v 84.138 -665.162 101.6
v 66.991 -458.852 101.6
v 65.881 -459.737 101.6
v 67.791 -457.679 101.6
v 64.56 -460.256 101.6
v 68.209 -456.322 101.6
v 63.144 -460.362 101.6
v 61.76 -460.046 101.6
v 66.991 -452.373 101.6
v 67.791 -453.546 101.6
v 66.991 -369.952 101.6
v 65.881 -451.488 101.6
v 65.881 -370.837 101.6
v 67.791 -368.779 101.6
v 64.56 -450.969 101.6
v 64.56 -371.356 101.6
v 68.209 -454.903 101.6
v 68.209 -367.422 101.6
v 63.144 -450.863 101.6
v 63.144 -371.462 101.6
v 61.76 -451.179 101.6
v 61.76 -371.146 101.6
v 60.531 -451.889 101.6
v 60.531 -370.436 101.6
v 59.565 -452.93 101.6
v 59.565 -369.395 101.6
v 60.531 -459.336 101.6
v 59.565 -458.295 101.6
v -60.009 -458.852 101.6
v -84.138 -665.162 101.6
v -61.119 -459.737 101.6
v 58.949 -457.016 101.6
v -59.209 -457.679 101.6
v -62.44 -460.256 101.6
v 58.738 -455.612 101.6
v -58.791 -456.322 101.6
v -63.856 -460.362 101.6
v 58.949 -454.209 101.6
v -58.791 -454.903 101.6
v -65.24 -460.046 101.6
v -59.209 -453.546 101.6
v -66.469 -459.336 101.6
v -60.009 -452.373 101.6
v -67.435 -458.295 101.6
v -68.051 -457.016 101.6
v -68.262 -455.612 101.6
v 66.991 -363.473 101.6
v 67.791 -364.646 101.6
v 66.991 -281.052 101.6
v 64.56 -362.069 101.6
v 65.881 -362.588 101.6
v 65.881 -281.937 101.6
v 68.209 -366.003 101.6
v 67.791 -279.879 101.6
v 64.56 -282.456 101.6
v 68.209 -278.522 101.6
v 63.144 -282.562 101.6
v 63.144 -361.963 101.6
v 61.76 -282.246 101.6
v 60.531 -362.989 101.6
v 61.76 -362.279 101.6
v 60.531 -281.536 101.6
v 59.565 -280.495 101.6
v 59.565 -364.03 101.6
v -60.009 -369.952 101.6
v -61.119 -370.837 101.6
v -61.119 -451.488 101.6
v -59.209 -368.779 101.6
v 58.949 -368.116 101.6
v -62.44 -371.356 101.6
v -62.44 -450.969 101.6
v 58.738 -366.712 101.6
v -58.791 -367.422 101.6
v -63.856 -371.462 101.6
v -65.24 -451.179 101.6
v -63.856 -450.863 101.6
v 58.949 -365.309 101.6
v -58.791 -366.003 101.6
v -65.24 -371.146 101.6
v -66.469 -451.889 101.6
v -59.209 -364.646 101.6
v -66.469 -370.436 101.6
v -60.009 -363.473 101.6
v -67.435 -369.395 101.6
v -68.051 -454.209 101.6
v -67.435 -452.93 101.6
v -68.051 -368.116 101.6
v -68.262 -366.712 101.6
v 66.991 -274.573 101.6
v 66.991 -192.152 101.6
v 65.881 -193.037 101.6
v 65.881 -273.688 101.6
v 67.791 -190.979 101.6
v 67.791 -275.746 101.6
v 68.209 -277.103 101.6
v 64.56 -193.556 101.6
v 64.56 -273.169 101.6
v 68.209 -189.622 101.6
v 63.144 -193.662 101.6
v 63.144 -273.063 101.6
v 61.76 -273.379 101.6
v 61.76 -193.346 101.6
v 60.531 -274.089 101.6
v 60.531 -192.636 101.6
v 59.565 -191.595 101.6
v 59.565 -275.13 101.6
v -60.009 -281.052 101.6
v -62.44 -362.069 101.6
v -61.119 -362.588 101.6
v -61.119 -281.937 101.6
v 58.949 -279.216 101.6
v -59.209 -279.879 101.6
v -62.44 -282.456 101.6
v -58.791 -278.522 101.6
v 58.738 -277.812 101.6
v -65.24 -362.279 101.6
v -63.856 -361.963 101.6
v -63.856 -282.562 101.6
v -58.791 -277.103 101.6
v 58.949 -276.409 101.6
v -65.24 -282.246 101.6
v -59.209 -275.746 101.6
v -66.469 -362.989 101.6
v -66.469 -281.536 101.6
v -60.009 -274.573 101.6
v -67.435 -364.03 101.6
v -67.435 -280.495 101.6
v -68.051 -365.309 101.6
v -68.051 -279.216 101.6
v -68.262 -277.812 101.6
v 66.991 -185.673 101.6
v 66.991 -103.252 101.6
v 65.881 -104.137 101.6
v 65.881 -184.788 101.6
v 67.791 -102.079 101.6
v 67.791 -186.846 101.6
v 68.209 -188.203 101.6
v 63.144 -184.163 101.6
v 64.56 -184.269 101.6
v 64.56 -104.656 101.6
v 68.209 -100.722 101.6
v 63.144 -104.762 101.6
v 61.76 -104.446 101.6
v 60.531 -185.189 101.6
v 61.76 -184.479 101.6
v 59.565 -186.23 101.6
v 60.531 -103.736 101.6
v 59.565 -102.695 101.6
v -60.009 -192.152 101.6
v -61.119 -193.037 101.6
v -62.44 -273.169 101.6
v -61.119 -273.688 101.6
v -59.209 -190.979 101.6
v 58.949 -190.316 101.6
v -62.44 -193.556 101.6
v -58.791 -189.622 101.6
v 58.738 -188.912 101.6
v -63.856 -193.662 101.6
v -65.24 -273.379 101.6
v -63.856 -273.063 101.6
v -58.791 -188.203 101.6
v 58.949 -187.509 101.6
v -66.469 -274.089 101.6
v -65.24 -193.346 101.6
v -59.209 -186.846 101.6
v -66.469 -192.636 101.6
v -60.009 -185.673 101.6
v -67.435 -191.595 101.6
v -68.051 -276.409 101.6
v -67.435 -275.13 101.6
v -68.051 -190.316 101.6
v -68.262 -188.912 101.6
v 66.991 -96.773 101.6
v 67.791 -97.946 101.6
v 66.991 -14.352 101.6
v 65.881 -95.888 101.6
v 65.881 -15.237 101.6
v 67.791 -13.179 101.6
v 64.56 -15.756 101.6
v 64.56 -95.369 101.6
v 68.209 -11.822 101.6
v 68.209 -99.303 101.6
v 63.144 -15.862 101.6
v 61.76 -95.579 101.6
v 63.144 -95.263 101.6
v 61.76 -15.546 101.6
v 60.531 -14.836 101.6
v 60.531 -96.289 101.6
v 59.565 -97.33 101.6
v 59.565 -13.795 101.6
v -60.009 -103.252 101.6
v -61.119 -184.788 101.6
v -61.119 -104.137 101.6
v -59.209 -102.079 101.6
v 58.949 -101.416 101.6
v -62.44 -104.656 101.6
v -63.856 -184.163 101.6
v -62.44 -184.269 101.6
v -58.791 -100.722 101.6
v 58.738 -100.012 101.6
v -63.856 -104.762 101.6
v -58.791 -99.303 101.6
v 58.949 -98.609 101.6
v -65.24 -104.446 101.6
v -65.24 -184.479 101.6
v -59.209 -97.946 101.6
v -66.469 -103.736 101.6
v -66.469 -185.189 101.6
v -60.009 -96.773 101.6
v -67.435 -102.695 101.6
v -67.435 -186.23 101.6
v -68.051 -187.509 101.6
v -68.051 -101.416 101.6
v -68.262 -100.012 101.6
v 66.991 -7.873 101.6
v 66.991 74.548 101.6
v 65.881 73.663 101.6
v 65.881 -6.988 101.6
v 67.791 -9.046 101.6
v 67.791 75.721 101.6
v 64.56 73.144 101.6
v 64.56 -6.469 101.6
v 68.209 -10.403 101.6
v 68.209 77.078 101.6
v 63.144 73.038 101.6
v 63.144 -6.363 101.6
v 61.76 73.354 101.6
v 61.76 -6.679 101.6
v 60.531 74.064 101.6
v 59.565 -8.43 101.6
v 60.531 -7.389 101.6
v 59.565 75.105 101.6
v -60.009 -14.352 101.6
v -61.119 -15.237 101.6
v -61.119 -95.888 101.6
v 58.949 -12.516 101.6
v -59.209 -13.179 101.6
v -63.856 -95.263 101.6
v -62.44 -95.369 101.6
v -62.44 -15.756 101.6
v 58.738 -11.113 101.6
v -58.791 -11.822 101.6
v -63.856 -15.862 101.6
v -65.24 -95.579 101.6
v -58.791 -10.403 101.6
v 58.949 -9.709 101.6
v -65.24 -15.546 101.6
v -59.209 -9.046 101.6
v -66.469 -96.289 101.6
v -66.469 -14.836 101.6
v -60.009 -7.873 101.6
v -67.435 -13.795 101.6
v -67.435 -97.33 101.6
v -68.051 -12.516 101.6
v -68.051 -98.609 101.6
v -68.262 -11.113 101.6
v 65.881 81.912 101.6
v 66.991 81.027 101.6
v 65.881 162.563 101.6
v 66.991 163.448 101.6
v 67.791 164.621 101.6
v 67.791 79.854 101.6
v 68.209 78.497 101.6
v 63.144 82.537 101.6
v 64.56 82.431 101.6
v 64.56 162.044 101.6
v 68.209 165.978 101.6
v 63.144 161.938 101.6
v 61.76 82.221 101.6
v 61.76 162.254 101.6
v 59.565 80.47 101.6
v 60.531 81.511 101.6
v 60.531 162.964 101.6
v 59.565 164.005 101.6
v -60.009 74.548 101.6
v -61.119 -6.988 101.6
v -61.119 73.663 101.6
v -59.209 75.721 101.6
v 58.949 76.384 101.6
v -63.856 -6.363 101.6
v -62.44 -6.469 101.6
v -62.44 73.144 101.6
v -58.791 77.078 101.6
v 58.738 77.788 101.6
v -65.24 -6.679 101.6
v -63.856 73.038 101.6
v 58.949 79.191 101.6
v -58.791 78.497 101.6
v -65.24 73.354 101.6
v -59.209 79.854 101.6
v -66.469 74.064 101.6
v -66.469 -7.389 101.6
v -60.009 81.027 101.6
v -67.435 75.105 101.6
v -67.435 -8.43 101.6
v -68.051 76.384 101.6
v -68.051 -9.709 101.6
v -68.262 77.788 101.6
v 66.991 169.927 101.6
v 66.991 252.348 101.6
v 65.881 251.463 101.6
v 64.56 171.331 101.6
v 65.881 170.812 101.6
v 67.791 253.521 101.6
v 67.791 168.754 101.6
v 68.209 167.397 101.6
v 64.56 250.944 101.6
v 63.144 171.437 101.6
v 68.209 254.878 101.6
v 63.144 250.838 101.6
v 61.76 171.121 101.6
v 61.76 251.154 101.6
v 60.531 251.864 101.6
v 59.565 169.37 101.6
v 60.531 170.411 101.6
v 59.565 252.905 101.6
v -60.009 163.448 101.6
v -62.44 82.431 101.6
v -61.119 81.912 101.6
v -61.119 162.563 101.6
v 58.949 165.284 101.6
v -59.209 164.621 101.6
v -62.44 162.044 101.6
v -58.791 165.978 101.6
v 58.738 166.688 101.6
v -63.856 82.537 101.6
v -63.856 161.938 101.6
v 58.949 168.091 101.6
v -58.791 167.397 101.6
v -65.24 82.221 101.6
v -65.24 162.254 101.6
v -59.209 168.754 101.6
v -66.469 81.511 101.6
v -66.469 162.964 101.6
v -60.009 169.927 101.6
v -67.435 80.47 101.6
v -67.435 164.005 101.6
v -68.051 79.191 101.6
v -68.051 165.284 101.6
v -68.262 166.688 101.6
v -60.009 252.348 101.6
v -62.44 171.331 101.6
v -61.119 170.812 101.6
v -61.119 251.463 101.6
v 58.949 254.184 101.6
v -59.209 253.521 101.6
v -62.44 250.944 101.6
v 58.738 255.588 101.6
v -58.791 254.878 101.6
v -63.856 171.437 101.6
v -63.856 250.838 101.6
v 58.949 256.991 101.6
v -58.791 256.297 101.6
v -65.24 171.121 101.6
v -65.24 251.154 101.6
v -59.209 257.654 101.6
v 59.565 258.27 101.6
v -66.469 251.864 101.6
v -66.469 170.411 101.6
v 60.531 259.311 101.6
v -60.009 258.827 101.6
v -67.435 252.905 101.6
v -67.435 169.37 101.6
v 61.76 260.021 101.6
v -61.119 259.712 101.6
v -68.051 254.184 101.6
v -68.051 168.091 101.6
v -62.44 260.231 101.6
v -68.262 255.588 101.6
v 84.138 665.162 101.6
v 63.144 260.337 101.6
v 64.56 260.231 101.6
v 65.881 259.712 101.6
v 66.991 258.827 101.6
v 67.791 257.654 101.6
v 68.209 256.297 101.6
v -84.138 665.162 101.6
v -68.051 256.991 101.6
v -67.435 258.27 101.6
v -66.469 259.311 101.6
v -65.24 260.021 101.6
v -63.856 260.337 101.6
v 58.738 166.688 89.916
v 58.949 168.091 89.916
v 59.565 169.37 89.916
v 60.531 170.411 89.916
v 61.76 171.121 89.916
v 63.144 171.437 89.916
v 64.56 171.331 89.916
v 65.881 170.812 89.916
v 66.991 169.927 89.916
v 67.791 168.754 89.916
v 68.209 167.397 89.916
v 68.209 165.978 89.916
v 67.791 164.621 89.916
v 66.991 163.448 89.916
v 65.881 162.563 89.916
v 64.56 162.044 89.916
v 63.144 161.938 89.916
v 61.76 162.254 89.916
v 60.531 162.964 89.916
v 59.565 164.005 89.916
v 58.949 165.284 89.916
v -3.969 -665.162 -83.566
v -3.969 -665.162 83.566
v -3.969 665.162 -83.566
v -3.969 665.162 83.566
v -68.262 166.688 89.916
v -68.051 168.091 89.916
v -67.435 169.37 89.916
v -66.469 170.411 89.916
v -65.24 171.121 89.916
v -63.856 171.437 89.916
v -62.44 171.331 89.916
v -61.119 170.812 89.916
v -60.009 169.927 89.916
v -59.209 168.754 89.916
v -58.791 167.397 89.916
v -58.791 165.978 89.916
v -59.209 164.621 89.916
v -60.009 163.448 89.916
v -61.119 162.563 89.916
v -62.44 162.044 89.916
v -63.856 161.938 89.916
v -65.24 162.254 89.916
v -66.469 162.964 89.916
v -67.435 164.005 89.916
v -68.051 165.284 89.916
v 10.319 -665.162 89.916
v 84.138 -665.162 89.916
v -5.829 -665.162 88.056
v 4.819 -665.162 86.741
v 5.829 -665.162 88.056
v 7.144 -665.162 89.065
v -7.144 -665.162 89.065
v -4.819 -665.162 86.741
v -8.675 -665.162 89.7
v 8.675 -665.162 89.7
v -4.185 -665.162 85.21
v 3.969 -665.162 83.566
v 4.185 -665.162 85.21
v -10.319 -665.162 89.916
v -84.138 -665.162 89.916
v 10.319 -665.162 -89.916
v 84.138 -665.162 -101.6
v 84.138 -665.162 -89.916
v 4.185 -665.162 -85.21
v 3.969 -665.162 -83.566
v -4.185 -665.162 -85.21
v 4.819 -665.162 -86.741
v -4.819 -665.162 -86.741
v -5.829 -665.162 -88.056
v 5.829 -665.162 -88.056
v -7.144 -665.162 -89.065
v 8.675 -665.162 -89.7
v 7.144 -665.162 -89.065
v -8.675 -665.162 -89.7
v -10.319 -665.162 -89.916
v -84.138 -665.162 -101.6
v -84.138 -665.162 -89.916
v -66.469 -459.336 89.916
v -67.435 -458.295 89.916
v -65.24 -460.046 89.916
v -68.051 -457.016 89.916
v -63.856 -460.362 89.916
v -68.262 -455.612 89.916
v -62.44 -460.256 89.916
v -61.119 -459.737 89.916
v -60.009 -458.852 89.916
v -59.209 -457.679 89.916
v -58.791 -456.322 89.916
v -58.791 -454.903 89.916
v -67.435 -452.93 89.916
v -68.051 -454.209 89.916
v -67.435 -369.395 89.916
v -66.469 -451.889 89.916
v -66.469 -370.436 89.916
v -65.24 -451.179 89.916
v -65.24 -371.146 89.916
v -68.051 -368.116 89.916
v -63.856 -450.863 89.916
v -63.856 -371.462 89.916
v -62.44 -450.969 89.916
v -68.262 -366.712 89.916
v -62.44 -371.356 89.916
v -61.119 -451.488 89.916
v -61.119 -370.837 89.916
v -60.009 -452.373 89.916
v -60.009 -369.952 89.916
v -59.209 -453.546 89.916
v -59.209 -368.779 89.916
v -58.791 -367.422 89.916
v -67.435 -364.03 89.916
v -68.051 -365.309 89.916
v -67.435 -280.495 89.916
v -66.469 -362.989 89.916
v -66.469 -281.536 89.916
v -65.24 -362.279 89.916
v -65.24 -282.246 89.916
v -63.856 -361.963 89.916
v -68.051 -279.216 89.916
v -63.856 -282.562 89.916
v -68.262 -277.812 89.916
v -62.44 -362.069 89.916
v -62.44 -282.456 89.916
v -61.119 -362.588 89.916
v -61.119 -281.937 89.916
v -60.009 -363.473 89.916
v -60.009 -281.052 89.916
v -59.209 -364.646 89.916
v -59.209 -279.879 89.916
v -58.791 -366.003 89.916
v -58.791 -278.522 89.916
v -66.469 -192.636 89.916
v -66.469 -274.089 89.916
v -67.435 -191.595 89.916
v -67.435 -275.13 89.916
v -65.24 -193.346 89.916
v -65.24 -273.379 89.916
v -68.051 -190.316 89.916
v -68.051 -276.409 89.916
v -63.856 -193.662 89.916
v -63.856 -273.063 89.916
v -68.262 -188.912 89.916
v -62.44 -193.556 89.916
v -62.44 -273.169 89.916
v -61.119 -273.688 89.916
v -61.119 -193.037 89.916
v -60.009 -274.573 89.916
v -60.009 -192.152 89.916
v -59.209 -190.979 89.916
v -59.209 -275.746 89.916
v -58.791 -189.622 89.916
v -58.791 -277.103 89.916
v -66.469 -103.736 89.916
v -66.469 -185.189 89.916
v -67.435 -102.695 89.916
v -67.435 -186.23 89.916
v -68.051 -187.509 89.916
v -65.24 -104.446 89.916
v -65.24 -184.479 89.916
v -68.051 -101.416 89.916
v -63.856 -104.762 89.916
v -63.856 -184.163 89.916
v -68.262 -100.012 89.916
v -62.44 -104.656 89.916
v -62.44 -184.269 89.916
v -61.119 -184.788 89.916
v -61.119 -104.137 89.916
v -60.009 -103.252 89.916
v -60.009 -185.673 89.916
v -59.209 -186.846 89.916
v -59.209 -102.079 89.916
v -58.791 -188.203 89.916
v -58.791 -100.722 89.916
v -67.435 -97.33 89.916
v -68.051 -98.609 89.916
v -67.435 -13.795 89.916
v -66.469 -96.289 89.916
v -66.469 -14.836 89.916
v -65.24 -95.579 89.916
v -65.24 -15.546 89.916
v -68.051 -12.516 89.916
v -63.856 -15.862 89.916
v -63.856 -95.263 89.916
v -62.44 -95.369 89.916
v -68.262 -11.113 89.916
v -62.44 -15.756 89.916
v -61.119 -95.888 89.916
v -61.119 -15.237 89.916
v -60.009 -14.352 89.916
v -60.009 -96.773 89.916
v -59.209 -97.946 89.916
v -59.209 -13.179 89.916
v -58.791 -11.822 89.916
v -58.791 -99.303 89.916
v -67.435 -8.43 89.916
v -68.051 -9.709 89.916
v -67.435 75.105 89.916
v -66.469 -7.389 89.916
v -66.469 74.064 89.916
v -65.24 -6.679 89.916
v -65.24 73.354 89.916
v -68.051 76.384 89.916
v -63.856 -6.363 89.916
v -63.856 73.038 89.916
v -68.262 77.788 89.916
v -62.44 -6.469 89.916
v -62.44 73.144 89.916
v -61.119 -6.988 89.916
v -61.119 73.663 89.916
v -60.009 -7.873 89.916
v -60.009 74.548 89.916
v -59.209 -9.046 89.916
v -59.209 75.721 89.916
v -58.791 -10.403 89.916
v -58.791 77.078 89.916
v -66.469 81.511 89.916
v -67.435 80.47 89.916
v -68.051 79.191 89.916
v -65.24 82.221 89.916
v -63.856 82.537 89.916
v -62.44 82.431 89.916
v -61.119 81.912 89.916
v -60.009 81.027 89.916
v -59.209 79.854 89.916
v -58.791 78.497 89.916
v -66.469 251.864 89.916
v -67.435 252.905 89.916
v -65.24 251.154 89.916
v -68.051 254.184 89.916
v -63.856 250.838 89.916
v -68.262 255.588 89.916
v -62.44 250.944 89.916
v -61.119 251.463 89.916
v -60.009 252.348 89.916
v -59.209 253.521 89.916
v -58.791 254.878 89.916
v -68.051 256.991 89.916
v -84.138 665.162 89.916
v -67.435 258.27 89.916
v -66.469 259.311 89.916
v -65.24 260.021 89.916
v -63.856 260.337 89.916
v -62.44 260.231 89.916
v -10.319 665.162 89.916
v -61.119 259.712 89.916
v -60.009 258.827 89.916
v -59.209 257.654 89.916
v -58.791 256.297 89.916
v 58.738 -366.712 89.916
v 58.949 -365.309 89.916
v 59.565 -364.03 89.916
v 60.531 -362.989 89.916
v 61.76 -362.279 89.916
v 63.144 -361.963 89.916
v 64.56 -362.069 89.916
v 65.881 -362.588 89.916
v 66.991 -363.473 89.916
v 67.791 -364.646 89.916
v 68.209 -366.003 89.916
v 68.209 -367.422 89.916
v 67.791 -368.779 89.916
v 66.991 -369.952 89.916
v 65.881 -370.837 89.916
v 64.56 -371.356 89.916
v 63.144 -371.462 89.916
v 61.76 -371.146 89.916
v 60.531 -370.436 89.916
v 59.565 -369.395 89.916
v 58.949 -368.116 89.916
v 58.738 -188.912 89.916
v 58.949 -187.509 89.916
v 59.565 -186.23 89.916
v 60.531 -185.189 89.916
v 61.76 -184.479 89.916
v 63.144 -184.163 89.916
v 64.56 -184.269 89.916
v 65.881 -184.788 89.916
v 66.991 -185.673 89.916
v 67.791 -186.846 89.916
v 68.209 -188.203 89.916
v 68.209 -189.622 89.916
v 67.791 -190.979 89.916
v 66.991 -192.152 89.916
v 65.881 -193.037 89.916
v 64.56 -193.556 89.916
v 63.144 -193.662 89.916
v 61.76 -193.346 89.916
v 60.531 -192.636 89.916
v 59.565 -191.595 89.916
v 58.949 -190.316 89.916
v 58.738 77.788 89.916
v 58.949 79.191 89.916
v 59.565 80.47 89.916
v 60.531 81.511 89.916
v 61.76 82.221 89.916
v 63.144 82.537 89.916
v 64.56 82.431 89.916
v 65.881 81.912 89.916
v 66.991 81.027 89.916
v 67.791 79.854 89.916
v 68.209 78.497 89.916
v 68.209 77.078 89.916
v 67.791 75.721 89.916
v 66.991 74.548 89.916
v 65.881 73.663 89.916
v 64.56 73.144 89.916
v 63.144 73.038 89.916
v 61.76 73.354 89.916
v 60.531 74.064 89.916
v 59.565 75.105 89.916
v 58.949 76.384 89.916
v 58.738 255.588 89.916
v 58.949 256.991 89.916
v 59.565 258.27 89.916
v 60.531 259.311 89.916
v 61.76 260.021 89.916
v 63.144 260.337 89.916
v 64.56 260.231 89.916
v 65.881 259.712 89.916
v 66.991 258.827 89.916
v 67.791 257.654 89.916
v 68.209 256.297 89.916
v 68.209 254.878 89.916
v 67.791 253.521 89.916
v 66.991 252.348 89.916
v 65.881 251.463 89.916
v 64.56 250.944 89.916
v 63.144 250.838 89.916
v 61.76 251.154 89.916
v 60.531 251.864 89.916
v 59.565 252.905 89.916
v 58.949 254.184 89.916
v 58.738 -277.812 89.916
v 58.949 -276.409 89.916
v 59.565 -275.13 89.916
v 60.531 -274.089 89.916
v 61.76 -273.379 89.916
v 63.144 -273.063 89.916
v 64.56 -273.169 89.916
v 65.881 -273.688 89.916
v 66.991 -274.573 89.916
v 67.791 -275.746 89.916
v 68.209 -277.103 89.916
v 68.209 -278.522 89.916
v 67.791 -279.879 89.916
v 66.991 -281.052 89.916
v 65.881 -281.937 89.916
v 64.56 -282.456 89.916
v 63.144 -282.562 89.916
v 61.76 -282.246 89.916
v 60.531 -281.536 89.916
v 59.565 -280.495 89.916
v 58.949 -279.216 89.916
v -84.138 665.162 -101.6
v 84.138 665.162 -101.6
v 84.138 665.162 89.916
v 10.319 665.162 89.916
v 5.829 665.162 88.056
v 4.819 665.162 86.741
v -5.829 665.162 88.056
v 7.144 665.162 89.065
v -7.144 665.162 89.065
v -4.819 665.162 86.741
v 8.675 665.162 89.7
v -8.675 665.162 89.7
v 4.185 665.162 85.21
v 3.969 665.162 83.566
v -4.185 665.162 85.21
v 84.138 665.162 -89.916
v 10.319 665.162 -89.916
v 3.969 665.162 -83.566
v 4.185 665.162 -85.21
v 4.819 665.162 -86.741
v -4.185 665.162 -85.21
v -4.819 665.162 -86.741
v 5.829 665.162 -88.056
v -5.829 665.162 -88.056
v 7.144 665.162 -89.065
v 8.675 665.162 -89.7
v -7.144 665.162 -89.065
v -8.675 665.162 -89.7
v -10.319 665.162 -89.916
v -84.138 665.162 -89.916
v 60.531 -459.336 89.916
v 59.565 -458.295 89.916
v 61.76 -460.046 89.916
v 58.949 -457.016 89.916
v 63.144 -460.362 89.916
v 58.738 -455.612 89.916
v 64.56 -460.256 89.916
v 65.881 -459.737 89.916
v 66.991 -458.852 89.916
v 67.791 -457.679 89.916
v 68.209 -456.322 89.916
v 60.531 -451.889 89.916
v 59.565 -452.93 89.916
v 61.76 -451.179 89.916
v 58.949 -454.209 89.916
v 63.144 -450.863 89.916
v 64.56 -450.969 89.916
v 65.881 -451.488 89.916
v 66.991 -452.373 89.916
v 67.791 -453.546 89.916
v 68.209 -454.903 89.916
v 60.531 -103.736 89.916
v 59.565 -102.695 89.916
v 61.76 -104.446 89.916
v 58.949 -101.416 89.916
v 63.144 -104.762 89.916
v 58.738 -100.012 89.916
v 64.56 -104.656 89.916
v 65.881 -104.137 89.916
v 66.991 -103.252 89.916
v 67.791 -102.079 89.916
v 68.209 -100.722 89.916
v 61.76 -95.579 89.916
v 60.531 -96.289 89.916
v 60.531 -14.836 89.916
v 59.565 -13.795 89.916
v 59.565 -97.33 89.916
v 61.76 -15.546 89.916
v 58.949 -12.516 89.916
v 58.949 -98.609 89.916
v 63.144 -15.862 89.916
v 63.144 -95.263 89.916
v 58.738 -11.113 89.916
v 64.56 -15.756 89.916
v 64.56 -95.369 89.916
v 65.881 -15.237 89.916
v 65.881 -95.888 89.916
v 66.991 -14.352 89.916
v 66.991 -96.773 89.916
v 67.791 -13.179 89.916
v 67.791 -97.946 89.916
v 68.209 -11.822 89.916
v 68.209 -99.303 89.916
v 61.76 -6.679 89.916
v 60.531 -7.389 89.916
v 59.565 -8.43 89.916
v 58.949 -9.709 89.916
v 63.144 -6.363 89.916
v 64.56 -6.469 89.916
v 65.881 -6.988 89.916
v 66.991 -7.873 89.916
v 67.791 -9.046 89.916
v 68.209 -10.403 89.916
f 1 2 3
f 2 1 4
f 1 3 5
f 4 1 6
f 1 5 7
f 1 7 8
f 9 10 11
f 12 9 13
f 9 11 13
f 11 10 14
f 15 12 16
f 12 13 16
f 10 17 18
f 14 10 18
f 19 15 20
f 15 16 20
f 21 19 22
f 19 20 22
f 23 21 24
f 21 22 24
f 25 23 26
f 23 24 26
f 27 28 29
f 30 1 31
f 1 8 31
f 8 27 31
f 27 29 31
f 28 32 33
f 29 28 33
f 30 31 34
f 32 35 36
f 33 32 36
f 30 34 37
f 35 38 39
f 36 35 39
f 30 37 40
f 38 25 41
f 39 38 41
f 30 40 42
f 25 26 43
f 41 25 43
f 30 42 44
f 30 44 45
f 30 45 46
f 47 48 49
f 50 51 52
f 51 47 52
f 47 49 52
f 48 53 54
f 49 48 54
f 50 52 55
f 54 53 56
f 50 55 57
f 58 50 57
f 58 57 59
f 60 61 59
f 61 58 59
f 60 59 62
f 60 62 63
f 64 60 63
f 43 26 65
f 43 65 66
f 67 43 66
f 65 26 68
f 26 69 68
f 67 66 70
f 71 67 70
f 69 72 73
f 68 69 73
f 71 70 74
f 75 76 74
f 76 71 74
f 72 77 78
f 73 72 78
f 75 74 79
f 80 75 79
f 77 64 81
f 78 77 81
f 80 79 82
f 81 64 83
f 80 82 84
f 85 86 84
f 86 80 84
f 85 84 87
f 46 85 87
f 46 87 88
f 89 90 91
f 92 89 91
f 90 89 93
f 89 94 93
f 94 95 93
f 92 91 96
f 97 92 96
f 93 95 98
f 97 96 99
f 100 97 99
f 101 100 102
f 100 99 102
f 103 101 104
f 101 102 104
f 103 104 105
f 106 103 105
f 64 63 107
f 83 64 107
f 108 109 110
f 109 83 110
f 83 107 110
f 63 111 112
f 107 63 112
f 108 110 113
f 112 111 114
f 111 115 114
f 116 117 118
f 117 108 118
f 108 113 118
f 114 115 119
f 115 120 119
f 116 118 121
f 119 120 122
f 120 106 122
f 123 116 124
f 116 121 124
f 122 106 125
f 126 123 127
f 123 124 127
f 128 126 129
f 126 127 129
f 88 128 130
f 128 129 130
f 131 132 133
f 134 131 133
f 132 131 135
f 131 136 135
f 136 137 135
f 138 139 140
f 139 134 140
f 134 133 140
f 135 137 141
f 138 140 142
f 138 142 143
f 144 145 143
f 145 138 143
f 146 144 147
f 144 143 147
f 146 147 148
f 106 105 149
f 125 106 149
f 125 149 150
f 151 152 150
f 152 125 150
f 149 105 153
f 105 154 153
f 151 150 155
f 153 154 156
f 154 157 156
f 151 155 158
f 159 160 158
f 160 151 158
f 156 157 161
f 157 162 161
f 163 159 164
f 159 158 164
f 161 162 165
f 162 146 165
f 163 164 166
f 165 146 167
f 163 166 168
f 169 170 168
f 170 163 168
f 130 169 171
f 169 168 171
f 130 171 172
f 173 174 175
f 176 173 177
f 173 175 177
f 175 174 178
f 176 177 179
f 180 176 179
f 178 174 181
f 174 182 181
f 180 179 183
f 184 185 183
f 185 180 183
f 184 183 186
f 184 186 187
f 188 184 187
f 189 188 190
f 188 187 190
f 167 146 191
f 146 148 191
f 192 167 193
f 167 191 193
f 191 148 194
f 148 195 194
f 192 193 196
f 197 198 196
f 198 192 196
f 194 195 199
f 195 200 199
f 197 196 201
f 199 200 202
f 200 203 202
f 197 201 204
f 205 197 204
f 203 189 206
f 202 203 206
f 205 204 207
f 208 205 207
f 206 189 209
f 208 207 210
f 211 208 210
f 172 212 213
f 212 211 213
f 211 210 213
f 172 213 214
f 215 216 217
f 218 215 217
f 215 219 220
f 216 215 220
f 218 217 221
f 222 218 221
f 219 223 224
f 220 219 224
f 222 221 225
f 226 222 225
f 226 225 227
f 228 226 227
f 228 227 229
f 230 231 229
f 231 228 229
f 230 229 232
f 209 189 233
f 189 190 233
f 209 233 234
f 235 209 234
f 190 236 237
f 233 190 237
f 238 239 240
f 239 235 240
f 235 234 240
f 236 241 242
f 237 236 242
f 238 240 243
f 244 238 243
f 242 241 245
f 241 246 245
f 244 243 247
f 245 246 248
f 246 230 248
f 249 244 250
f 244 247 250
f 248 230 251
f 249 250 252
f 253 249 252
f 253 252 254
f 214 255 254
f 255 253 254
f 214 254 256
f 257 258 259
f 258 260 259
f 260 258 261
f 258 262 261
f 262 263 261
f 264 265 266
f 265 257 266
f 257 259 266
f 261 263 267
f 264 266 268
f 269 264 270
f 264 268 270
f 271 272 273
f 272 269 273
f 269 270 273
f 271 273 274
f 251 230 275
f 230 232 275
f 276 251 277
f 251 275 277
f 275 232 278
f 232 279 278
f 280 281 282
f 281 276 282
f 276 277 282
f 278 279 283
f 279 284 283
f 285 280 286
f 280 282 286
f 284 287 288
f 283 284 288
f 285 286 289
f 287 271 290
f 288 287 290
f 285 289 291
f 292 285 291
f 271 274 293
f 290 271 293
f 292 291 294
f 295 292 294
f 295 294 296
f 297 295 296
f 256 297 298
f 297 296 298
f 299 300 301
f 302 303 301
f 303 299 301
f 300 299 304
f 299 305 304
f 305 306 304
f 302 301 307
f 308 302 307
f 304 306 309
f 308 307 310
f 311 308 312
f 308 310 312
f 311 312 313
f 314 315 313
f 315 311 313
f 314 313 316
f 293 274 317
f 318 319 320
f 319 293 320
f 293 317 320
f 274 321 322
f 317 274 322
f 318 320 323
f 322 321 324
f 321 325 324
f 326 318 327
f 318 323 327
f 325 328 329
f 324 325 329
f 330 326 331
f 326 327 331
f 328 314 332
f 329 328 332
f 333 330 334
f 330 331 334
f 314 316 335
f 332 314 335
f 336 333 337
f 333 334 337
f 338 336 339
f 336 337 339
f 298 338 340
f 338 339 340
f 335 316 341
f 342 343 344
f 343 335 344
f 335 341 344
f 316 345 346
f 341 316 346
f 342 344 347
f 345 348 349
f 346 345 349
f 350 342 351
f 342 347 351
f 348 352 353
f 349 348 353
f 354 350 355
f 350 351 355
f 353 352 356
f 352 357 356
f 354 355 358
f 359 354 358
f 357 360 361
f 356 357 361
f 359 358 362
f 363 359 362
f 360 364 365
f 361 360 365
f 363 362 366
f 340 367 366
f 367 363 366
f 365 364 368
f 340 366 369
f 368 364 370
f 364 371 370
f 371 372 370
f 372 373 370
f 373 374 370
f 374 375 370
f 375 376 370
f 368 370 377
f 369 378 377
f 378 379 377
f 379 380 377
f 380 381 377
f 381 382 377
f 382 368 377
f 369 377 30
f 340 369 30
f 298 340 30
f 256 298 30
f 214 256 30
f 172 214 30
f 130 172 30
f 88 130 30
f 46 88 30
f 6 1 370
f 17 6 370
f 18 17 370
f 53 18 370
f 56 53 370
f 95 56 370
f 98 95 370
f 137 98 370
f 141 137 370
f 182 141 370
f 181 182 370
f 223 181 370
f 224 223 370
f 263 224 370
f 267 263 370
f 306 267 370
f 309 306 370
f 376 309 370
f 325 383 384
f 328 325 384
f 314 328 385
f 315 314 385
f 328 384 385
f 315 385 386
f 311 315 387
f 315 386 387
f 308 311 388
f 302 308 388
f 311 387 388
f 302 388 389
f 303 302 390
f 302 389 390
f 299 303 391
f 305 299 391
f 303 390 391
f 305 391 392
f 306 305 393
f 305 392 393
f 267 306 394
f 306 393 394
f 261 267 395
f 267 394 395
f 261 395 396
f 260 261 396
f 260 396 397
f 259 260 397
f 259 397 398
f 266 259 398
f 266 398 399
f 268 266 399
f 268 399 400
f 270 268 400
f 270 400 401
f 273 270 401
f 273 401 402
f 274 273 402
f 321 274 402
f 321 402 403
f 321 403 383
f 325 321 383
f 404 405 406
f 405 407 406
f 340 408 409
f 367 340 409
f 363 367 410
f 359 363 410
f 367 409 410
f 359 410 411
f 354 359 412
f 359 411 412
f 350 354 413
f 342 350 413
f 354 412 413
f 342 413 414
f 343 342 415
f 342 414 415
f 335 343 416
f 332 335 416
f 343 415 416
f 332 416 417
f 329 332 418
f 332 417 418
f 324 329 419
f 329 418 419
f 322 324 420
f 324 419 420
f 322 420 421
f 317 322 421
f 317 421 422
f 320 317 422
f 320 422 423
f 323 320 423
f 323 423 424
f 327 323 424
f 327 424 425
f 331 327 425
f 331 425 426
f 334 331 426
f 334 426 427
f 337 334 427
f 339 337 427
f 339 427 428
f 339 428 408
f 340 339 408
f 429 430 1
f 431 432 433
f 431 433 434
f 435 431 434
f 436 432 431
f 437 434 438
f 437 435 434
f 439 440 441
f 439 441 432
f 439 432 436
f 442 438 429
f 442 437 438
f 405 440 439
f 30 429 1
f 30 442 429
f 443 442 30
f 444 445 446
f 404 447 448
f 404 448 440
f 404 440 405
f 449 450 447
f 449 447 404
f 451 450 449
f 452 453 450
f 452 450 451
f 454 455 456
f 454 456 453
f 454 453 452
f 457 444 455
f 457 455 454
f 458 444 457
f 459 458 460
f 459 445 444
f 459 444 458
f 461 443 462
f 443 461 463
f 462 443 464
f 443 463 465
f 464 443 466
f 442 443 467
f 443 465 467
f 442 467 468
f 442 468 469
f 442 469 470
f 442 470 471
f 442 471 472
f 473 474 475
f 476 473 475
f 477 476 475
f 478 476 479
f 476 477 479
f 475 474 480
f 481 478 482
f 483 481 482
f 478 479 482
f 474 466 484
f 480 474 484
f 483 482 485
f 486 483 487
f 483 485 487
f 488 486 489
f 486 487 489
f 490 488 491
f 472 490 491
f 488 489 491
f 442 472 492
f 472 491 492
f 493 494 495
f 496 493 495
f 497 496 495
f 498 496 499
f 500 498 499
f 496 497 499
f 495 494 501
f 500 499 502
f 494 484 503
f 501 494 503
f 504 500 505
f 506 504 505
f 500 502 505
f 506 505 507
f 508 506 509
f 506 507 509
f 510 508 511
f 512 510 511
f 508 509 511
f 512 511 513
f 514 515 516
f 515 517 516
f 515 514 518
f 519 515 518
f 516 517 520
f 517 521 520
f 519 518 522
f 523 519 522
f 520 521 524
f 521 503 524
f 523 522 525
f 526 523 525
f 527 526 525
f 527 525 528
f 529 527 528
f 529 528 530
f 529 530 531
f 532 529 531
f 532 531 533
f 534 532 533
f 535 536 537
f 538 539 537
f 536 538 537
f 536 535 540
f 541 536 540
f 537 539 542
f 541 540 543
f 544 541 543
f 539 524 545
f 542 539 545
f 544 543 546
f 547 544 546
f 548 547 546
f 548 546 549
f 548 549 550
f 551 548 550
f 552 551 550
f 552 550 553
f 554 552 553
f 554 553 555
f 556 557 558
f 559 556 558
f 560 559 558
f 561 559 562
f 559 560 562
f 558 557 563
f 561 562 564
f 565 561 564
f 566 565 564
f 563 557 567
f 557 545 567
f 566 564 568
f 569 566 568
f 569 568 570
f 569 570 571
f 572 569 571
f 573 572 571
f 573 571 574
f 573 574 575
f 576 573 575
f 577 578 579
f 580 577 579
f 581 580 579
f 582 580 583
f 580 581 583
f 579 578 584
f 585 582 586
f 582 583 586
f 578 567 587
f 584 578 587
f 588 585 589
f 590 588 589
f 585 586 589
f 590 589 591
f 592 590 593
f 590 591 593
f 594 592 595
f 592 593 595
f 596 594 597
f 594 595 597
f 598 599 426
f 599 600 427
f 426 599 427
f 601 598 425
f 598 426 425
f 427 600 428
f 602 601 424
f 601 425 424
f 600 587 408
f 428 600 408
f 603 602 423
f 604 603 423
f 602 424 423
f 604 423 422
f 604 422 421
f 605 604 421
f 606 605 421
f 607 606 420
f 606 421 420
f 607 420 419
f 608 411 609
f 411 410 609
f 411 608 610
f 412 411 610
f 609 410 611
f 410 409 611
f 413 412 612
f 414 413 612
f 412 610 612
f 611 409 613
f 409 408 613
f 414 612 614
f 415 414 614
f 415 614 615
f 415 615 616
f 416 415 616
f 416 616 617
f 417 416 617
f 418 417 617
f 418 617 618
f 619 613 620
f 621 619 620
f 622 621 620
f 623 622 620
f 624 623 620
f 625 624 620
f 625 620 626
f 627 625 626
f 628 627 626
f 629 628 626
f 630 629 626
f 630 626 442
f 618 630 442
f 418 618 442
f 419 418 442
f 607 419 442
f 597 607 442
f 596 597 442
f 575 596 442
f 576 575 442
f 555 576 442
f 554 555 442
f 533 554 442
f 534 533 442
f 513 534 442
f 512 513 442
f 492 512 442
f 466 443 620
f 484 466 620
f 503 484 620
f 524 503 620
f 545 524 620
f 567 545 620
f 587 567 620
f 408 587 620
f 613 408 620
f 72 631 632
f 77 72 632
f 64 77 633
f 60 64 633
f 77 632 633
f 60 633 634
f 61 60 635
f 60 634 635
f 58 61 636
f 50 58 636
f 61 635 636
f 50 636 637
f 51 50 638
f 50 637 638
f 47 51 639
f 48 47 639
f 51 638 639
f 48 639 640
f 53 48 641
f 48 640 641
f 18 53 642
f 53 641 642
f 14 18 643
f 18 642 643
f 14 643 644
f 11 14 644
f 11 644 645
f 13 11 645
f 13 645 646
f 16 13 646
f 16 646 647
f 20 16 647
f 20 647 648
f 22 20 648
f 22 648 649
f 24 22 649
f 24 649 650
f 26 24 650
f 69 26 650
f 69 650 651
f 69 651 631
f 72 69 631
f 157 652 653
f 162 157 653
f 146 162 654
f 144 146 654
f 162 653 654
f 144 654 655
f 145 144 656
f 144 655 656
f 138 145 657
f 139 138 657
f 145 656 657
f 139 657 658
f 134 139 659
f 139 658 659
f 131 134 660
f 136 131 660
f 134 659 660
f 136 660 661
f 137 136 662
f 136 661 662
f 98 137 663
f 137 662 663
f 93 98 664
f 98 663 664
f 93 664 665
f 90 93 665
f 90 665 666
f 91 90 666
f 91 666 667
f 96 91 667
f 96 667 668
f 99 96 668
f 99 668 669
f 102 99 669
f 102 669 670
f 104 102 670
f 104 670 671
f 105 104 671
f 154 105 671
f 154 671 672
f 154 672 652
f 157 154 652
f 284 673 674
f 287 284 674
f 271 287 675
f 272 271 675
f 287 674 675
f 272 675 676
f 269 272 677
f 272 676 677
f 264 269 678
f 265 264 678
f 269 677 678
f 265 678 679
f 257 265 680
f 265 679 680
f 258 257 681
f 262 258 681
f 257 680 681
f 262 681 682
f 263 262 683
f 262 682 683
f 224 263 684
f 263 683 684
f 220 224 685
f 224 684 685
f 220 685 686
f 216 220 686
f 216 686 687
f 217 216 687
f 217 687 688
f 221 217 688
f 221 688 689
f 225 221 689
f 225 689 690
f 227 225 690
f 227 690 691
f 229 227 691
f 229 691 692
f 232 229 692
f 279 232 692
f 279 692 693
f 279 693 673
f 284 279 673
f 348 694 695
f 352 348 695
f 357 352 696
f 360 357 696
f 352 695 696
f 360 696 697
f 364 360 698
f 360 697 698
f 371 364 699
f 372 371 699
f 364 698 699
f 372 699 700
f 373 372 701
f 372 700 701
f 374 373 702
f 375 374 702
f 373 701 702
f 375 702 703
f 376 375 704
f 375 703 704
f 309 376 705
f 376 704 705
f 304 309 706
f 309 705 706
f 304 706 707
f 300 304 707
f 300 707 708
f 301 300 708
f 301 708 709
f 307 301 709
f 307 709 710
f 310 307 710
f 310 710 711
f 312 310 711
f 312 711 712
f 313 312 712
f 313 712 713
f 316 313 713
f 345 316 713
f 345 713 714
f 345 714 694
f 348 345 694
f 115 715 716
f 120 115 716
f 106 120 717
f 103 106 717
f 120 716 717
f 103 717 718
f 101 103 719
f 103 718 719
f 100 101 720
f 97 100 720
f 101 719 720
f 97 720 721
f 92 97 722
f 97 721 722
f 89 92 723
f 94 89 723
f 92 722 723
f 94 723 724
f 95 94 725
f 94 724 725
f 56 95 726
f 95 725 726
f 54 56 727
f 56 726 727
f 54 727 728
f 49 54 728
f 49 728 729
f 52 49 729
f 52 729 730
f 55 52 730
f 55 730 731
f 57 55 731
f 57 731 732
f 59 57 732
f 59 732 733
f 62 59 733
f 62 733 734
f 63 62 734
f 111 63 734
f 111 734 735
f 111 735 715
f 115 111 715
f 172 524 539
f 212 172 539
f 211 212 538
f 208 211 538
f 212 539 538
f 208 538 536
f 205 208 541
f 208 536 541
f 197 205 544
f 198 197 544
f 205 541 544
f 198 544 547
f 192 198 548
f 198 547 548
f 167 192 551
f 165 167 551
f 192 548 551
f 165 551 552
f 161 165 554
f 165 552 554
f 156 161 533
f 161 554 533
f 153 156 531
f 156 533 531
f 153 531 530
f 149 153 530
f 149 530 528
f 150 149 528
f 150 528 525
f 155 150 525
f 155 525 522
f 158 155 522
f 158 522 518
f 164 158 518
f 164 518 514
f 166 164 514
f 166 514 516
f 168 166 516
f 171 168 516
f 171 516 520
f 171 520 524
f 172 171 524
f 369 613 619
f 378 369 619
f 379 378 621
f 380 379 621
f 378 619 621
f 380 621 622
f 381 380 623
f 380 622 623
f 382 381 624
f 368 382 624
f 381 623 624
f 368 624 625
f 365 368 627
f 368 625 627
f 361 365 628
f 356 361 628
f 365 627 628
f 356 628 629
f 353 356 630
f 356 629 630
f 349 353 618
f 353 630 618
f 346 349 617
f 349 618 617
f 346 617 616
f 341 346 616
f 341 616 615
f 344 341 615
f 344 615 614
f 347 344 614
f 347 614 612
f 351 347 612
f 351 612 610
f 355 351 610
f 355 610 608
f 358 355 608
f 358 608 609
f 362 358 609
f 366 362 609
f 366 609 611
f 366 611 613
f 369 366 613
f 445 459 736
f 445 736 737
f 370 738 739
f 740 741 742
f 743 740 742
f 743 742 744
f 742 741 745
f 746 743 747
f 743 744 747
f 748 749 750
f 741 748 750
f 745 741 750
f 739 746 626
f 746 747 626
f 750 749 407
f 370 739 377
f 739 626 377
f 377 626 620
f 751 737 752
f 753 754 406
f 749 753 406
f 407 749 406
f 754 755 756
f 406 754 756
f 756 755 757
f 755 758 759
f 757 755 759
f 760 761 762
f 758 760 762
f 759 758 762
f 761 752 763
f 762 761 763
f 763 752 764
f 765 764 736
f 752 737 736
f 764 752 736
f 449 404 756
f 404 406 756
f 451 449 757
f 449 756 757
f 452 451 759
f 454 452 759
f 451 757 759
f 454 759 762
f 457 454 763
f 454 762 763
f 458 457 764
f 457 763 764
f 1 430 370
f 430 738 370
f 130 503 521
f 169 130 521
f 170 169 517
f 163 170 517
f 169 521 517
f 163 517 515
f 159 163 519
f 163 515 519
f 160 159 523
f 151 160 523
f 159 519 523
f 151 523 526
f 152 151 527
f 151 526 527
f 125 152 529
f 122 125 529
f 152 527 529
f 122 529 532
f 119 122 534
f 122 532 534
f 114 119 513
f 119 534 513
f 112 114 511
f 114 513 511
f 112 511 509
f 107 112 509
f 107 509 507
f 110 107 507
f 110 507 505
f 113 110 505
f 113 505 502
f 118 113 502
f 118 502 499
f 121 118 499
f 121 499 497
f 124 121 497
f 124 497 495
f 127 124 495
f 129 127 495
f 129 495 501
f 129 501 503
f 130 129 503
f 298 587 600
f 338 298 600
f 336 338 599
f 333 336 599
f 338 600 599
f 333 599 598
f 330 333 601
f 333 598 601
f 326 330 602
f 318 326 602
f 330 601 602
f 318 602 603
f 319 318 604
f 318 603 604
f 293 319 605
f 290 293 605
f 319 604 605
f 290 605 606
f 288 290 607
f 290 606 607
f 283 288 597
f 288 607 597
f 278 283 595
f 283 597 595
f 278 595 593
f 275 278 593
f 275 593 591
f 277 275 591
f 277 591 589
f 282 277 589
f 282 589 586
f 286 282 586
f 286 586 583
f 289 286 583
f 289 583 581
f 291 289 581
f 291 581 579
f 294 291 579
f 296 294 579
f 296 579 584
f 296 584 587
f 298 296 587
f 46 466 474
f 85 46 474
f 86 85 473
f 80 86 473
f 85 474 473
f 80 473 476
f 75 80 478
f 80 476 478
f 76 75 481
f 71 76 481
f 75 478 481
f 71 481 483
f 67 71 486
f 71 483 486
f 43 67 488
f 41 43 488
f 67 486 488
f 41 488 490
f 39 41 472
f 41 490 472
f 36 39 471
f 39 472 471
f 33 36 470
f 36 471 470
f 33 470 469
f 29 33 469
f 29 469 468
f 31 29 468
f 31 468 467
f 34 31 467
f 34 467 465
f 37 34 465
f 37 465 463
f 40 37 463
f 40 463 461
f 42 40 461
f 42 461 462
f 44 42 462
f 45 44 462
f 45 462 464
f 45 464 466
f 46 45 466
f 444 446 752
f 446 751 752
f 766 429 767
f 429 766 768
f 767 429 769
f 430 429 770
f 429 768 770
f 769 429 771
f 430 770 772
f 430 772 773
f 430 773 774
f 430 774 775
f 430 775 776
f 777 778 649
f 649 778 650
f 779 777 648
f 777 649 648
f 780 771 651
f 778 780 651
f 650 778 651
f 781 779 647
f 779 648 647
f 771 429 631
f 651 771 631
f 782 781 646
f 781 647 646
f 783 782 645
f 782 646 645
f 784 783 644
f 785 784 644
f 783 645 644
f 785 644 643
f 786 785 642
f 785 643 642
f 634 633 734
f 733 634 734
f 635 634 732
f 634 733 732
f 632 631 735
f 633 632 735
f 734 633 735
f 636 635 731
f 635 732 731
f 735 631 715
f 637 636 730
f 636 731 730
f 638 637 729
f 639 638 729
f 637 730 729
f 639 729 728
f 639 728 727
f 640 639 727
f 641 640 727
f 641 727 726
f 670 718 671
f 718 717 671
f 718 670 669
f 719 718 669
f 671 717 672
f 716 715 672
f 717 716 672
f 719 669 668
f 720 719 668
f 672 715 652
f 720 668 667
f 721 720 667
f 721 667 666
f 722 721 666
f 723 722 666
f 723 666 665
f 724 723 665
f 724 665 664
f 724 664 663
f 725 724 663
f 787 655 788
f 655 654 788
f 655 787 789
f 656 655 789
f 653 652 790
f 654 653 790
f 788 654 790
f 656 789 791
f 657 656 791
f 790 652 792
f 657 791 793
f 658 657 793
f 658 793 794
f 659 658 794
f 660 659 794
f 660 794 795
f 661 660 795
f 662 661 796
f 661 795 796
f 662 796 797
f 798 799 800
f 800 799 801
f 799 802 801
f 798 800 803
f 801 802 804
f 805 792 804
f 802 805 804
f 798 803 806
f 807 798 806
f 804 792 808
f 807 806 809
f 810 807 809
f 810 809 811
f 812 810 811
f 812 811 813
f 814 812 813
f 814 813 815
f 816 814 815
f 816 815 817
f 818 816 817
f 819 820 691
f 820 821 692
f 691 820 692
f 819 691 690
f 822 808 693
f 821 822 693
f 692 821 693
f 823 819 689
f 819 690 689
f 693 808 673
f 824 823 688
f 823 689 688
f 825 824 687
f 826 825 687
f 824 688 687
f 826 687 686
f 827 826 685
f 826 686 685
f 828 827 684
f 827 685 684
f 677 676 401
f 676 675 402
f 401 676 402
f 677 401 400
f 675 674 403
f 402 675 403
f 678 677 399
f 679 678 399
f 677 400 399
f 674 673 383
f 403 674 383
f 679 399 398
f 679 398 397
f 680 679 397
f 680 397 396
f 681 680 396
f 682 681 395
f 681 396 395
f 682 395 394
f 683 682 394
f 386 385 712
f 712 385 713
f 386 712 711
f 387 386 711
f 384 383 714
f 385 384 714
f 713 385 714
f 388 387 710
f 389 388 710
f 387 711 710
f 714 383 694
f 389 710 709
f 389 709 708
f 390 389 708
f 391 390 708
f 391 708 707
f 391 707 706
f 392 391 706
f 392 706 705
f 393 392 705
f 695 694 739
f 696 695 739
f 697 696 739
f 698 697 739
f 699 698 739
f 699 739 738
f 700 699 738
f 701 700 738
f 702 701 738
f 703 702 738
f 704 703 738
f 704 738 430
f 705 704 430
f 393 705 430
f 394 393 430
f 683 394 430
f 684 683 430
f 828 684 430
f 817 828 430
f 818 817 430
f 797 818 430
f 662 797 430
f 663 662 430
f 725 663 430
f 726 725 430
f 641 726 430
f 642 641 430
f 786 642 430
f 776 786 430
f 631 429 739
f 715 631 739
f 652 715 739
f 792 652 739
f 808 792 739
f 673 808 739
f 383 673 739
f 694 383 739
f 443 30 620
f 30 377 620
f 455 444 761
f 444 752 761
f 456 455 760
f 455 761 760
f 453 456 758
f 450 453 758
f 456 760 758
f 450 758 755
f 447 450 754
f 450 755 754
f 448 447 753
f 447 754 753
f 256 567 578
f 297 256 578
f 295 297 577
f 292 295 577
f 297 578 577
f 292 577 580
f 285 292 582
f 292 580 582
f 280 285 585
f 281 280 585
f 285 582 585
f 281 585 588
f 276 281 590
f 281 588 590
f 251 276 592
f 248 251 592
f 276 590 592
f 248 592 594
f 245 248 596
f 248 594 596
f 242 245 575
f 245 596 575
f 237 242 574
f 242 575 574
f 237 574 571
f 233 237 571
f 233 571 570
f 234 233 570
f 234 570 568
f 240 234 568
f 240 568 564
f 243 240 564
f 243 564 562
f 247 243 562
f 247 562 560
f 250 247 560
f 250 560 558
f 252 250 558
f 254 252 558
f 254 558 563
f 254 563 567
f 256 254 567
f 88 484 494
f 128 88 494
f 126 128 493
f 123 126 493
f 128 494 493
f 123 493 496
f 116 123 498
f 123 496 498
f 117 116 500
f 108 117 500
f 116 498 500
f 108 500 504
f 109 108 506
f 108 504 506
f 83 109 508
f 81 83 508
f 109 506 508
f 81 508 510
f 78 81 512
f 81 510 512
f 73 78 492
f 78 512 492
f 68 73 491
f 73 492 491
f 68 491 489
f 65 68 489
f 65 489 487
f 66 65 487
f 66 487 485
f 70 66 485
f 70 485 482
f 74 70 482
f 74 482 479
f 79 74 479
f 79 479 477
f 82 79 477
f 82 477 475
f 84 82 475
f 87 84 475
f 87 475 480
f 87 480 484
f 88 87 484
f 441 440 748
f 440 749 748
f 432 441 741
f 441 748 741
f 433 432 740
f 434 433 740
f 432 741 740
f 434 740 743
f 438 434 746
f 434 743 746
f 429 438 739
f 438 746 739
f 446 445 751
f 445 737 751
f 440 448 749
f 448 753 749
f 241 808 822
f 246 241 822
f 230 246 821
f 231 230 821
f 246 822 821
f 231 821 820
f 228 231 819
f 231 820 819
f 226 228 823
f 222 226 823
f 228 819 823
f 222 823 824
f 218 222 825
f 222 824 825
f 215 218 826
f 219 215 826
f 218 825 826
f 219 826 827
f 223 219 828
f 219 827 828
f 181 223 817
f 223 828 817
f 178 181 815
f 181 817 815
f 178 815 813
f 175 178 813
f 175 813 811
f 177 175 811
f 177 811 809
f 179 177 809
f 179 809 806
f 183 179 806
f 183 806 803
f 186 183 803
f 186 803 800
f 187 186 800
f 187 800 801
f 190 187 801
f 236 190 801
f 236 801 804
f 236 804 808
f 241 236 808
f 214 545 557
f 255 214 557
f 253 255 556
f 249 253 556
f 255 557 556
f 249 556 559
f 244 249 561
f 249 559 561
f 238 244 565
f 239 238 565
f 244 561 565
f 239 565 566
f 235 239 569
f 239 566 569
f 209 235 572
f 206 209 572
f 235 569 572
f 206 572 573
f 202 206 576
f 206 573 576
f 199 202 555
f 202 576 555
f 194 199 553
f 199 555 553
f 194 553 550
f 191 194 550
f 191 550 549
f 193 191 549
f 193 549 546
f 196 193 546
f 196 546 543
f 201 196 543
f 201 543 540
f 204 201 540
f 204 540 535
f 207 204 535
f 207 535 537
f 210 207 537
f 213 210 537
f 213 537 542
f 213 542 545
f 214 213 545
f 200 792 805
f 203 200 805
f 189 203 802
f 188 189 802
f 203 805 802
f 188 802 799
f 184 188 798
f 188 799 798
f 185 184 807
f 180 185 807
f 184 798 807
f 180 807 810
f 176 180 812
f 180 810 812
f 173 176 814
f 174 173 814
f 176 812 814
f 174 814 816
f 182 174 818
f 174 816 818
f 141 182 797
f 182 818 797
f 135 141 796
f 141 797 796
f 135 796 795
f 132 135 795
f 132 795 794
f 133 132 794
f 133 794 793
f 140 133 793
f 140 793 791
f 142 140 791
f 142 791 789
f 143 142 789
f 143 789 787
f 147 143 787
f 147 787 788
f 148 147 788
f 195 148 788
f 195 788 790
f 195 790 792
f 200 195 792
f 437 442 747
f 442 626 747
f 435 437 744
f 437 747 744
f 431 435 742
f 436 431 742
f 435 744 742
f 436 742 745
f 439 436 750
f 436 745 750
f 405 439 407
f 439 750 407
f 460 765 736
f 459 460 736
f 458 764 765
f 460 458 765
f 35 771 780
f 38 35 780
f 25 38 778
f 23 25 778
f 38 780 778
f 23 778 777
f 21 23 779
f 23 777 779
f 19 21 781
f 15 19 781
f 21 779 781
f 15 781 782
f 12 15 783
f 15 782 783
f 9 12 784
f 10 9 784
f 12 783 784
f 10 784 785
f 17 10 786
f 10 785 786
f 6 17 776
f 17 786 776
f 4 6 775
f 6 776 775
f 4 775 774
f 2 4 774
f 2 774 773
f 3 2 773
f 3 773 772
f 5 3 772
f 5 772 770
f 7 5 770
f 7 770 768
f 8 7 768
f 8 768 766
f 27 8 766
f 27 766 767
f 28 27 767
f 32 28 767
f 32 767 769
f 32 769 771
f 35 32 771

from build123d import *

# Parameters (mm, degrees)
BOSS_EXTRUDE1_DEPTH              = 665.1625
F_3_8_0_375_DIAMETER_HOLE1_D     = 9.525
F_3_8_0_375_DIAMETER_HOLE1_DEPTH = 11.684


with BuildPart() as part:
    # Sketch1 → Boss-Extrude1 (new body, symmetric)
    with BuildSketch(Plane(origin=(0, 0, 0), x_dir=(1, 0, 0), z_dir=(0, 1, 0))):
        with BuildLine():
            Line((-84.1375, 101.6), (84.1375, 101.6))
            Line((84.1375, 101.6), (84.1375, 89.916))
            Line((84.1375, 89.916), (10.31875, 89.916))
            ThreePointArc((10.31875, 89.916), (5.828621939, 88.056128061), (3.96875, 83.566))
            Line((3.96875, 83.566), (3.96875, -83.566))
            ThreePointArc((3.96875, -83.566), (5.828621939, -88.056128061), (10.31875, -89.916))
            Line((10.31875, -89.916), (84.1375, -89.916))
            Line((84.1375, -89.916), (84.1375, -101.6))
            Line((84.1375, -101.6), (-84.1375, -101.6))
            Line((-84.1375, -101.6), (-84.1375, -89.916))
            Line((-84.1375, -89.916), (-10.31875, -89.916))
            ThreePointArc((-10.31875, -89.916), (-5.828621939, -88.056128061), (-3.96875, -83.566))
            Line((-3.96875, -83.566), (-3.96875, 83.566))
            ThreePointArc((-3.96875, 83.566), (-5.828621939, 88.056128061), (-10.31875, 89.916))
            Line((-10.31875, 89.916), (-84.1375, 89.916))
            Line((-84.1375, 89.916), (-84.1375, 101.6))
        make_face()
    extrude(amount=BOSS_EXTRUDE1_DEPTH, both=True)

    # 3/8 (0.375) Diameter Hole1
    with Locations(Plane.XY.offset(101.6)):
        with Locations((-63.5, 255.5875), (63.5, 255.5875), (63.5, -455.6125), (63.5, -366.7125), (63.5, -277.8125), (63.5, -188.9125), (63.5, -100.0125), (63.5, -11.1125), (63.5, 77.7875), (-63.5, -455.6125), (-63.5, -366.7125), (-63.5, -277.8125), (-63.5, -188.9125), (-63.5, -100.0125), (-63.5, -11.1125), (-63.5, 77.7875), (-63.5, 166.6875), (63.5, 166.6875)):
            Hole(F_3_8_0_375_DIAMETER_HOLE1_D / 2, depth=F_3_8_0_375_DIAMETER_HOLE1_DEPTH)


solid = part.part
